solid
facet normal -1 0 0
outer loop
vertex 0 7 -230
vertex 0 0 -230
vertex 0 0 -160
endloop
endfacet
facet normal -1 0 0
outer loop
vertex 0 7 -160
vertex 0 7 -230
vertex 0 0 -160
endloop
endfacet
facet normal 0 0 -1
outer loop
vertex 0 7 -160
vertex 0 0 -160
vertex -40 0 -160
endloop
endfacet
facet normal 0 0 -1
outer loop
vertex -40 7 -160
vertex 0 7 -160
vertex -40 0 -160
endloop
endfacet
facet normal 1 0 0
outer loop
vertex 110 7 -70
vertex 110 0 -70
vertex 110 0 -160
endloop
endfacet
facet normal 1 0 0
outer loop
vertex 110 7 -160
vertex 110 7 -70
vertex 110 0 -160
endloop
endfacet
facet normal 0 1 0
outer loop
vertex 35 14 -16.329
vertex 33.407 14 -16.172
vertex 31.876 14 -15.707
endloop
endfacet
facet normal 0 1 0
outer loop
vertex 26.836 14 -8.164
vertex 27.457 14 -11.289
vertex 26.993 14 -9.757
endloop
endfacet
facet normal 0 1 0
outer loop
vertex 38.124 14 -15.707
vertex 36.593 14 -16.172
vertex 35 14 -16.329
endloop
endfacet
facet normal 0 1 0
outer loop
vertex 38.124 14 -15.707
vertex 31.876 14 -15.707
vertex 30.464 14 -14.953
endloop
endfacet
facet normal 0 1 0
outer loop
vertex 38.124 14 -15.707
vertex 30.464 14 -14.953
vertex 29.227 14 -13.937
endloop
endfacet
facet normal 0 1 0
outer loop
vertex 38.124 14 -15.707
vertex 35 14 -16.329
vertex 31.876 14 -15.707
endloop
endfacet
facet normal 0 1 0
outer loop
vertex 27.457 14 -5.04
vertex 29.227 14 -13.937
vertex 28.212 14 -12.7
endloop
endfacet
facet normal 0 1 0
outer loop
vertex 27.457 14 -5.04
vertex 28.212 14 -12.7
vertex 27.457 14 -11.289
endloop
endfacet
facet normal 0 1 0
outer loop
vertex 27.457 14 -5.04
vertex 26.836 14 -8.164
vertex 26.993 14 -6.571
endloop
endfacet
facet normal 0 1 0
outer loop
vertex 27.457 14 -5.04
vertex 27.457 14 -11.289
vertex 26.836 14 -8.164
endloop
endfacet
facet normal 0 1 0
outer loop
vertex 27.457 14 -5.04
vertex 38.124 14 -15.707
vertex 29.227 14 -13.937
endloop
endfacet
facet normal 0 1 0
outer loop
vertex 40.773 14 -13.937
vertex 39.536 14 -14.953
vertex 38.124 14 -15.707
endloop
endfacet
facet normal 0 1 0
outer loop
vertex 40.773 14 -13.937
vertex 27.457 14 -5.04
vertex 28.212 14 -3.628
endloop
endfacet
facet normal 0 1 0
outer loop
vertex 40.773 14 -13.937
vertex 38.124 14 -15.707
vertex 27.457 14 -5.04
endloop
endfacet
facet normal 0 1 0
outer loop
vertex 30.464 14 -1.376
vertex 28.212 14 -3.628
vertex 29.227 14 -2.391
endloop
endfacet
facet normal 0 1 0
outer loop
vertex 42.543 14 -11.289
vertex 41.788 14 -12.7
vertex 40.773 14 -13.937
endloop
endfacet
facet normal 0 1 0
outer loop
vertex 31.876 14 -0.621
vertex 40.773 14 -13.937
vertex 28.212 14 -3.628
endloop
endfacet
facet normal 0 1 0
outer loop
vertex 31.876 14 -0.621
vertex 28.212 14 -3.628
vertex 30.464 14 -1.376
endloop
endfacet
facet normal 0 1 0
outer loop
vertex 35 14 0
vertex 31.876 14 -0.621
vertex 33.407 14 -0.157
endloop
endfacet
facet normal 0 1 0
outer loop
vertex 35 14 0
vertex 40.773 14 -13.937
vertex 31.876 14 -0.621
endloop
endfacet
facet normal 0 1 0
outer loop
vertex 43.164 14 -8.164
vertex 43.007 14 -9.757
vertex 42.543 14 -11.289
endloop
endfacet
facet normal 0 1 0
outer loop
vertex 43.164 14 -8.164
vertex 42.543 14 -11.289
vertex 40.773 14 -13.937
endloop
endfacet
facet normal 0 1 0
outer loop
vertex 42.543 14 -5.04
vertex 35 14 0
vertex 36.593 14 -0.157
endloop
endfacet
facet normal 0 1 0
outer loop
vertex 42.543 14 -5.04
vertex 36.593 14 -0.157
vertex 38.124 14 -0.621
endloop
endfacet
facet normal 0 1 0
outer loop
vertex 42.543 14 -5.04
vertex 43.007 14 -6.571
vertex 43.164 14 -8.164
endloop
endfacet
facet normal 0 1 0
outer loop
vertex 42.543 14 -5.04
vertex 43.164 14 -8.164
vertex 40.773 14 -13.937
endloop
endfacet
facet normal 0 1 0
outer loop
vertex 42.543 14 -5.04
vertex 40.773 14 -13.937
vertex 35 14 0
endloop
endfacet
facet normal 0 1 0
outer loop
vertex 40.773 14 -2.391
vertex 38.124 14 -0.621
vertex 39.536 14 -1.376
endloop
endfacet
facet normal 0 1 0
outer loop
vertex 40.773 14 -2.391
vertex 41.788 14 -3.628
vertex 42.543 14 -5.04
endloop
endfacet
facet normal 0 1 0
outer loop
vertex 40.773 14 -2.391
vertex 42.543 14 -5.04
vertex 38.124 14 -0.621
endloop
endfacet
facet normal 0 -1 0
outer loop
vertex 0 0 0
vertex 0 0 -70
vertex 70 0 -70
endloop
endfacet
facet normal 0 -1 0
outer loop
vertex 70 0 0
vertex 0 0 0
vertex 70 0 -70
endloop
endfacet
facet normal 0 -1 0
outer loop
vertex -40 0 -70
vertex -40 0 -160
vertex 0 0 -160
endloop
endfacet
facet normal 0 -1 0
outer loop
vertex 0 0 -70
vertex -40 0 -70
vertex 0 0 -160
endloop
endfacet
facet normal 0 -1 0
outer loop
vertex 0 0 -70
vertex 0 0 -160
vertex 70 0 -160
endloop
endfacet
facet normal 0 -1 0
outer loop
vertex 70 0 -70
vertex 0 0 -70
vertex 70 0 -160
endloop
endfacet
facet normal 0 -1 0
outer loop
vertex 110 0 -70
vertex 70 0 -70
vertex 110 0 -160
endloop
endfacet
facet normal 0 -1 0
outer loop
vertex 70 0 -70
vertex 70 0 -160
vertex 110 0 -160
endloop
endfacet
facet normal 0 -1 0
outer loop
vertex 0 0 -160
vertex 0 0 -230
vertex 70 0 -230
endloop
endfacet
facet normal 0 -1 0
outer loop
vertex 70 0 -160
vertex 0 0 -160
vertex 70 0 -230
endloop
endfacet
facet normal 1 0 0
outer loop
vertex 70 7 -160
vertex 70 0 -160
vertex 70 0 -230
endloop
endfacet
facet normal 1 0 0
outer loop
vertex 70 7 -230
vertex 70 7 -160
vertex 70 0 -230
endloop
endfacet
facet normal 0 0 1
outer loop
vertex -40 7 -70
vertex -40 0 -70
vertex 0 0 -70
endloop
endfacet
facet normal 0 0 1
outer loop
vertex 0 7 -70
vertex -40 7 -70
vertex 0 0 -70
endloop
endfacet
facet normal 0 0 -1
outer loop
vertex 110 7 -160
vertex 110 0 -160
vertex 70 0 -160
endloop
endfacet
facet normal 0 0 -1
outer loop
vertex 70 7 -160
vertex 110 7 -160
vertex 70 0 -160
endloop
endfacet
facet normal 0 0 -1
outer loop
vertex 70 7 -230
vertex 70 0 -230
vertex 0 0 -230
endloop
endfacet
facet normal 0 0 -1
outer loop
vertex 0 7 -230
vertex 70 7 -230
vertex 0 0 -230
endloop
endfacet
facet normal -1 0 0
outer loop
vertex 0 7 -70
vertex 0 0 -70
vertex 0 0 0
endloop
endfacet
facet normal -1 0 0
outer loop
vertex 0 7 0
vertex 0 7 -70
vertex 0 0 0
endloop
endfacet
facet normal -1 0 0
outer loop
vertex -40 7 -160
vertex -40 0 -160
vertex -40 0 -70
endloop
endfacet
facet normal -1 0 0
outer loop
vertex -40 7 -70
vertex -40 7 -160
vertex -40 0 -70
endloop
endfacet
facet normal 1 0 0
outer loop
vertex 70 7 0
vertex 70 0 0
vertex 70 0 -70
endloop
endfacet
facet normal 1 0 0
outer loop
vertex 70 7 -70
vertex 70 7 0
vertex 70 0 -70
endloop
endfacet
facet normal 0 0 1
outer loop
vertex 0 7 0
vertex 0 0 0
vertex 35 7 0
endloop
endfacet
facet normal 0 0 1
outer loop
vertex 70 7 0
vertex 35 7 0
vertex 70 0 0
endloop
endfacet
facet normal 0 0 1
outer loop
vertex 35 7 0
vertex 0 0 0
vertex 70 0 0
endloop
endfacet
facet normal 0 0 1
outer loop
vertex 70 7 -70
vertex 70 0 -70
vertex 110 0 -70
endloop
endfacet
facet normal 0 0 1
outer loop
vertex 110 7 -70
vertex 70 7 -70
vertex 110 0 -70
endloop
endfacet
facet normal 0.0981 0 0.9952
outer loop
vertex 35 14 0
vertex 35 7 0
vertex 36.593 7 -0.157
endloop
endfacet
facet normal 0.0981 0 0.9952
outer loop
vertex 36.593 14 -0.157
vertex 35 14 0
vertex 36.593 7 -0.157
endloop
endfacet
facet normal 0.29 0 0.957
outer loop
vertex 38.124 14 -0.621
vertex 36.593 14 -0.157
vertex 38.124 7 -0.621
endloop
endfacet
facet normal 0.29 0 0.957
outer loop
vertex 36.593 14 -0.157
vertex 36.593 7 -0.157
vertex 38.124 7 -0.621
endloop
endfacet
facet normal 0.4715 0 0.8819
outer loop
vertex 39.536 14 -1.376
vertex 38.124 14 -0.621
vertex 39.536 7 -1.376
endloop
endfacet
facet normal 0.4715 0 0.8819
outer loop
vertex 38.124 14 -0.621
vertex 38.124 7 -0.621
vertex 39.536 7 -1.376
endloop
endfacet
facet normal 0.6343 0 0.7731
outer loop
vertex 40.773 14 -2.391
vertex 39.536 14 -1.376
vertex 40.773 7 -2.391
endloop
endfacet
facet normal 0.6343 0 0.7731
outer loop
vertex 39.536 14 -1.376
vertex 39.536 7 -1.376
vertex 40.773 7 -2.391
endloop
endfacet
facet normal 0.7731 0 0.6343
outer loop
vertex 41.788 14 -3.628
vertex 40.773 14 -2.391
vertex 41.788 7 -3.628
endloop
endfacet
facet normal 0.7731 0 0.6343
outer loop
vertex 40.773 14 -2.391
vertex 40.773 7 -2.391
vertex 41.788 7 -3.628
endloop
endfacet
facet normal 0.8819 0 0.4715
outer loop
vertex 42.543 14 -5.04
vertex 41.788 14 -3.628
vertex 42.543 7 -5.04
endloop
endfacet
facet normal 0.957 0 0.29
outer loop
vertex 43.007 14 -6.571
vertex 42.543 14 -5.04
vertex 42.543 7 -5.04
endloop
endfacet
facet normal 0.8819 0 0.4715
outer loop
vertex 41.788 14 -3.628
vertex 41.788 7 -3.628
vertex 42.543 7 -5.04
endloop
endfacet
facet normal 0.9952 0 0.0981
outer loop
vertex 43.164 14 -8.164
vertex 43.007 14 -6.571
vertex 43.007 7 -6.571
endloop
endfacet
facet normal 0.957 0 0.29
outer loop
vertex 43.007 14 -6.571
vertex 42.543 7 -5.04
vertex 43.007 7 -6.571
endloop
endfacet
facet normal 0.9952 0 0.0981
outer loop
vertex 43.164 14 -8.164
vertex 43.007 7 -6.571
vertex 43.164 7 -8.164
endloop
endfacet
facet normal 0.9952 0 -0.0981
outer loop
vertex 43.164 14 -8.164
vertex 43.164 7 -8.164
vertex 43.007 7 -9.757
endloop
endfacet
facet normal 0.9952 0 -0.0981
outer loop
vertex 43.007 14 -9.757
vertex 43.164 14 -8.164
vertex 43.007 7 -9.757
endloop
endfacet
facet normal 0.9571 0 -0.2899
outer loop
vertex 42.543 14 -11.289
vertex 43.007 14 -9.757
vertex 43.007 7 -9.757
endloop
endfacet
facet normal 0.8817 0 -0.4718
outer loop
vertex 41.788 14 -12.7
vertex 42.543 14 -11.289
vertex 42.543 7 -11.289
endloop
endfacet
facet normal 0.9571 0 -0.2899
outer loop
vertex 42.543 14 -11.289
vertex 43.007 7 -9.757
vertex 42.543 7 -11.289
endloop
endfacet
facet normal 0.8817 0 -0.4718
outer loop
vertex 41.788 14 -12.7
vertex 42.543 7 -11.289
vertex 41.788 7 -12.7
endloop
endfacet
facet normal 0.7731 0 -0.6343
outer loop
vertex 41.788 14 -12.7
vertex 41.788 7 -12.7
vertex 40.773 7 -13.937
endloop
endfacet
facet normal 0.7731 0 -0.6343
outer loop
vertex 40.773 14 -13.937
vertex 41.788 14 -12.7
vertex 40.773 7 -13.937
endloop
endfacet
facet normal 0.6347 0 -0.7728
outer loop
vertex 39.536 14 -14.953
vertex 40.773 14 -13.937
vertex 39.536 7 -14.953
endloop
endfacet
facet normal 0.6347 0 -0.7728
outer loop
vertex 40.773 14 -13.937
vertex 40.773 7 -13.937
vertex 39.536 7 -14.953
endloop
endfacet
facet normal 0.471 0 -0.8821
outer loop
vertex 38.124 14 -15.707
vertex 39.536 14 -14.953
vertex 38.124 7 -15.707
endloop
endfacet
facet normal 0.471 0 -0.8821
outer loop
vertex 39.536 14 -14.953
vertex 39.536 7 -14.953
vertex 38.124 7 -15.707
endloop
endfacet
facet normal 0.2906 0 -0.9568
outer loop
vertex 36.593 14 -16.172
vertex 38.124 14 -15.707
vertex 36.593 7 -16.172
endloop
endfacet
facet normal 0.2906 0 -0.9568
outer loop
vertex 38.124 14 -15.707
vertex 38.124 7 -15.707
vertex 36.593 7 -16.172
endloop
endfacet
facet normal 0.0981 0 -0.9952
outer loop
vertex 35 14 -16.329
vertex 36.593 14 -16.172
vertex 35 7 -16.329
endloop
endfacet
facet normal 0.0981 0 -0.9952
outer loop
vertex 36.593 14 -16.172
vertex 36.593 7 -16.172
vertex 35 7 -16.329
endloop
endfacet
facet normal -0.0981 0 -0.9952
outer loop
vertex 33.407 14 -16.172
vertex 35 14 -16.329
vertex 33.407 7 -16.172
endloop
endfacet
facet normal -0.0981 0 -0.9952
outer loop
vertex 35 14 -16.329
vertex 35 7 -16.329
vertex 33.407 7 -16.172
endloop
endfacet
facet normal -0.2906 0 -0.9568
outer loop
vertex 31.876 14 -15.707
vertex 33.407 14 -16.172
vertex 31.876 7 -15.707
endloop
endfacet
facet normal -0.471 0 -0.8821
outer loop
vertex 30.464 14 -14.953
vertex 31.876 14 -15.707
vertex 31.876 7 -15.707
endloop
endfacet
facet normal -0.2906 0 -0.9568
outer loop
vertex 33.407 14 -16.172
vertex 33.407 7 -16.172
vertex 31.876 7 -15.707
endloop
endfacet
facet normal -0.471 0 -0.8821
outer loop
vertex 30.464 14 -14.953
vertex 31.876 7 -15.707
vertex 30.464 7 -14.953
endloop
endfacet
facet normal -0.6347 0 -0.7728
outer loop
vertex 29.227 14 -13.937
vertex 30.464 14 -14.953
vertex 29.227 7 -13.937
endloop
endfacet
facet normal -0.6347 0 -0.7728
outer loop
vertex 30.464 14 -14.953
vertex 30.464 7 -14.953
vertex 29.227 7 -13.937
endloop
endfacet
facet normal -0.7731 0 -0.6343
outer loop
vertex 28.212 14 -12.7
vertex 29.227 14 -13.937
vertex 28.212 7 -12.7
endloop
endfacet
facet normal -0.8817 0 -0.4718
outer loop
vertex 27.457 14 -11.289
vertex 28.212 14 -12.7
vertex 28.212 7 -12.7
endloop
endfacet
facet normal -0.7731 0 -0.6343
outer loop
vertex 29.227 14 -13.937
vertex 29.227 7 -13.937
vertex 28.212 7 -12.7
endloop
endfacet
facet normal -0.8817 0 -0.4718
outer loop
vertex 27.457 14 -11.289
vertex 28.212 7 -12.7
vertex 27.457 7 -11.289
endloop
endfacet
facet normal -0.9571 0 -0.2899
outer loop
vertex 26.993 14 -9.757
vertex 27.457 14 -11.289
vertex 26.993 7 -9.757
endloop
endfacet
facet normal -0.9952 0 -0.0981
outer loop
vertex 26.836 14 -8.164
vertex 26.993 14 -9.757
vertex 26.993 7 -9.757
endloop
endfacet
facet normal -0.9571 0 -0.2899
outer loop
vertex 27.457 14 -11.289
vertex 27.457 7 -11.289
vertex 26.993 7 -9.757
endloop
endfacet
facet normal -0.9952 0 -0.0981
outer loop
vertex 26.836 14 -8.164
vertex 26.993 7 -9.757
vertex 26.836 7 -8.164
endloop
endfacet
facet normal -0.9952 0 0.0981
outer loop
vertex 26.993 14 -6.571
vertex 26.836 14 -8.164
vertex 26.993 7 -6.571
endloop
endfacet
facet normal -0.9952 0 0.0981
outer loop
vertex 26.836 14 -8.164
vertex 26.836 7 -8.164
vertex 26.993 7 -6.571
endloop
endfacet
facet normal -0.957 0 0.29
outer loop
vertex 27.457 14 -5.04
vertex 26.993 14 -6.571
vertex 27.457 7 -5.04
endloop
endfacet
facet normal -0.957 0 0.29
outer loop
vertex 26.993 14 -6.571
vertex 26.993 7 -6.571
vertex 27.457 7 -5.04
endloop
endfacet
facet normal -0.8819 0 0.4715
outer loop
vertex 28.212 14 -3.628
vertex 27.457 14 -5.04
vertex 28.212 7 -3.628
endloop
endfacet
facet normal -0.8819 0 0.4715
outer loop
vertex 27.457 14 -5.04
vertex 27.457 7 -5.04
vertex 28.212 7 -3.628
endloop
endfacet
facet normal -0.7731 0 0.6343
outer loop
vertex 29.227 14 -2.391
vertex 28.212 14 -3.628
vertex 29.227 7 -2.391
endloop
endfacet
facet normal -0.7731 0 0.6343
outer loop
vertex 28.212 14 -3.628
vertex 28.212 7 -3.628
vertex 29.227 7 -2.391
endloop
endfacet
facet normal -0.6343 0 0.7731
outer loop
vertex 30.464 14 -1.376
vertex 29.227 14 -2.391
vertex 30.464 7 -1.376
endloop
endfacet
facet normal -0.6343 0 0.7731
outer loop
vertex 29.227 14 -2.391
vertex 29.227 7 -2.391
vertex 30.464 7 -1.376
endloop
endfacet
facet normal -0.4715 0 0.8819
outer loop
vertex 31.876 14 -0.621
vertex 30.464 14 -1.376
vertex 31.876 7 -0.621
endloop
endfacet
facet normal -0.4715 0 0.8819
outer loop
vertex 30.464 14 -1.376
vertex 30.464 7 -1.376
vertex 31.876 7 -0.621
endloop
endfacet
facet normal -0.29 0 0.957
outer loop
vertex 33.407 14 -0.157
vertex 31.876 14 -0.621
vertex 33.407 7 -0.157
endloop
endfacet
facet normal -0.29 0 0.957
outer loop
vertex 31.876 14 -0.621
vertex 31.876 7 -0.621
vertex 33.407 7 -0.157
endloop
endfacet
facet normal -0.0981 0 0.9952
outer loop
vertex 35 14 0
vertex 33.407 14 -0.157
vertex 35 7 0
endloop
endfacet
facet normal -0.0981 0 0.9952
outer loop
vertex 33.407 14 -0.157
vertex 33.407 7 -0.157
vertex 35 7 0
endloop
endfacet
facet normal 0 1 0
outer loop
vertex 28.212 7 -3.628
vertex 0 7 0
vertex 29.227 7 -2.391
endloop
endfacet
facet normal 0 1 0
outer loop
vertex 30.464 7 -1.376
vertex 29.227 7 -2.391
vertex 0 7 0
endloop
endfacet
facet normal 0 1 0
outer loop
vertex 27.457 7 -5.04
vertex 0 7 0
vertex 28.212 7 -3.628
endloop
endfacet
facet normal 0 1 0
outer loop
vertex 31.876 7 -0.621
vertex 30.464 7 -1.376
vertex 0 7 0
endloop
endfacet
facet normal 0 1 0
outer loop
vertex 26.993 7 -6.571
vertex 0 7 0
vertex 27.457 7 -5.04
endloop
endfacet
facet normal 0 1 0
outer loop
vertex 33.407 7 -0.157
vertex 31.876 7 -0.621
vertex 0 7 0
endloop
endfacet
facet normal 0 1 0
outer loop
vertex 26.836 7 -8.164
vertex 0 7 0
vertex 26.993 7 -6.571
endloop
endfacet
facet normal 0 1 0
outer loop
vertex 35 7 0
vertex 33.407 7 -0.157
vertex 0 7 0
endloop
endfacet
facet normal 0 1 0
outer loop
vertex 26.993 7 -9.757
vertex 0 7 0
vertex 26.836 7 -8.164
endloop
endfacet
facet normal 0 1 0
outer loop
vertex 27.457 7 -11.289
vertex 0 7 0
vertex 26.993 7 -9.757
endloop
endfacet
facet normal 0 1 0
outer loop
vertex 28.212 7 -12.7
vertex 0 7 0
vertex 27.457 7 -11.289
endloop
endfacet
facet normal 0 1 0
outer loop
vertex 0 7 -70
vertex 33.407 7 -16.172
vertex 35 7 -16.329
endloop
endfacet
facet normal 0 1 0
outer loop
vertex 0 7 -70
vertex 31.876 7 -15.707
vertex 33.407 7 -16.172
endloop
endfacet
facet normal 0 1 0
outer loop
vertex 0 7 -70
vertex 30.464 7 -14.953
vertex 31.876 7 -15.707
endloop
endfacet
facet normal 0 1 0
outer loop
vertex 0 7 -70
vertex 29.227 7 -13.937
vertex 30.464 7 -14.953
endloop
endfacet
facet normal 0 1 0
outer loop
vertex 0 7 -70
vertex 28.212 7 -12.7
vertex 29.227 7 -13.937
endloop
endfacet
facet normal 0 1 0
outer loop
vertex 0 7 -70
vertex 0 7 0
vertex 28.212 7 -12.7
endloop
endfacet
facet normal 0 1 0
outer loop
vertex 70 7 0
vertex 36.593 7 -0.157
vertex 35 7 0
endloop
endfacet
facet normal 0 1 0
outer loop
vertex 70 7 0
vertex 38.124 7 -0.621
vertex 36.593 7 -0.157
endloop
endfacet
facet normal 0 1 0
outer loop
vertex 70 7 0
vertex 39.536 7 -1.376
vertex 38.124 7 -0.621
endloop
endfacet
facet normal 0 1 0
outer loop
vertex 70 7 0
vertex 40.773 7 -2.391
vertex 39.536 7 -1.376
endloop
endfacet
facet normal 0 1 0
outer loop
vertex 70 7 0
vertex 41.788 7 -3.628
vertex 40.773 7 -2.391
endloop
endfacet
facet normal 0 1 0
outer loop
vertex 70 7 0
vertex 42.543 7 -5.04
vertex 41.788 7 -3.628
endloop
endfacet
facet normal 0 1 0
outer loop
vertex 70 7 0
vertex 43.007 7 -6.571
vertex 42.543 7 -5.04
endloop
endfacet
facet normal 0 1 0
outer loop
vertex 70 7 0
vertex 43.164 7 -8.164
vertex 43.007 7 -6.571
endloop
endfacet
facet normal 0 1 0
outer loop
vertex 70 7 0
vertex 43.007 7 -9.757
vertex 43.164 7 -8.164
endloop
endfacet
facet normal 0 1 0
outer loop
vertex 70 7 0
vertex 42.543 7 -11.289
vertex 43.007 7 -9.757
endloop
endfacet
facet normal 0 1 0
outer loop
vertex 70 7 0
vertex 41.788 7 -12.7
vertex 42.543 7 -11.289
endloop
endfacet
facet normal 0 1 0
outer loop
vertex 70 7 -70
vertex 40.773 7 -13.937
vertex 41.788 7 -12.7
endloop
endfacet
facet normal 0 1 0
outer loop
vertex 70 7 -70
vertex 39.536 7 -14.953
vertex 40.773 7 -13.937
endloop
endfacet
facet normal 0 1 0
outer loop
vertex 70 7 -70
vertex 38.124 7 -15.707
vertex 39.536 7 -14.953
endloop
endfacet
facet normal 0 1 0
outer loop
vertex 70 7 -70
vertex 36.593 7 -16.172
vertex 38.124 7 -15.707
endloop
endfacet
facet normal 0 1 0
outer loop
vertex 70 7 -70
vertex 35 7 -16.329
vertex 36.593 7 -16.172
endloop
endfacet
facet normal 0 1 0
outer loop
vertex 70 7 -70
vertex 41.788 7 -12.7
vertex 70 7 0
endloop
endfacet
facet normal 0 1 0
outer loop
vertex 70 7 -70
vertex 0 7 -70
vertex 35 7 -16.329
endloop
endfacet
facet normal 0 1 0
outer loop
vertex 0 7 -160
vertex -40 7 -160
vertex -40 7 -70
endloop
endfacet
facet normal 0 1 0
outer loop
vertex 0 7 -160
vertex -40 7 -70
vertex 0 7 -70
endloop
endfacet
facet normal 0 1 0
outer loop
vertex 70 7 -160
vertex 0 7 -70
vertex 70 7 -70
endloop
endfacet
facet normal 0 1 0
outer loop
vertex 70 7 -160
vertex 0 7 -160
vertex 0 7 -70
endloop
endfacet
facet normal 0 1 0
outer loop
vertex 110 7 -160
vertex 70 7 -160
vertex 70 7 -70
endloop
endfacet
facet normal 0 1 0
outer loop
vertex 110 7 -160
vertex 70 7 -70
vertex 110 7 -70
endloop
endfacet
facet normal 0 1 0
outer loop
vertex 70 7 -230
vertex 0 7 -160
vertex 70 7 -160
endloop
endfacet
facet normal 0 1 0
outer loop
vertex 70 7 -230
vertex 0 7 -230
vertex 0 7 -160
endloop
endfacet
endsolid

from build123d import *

# Parameters (mm, degrees)
EXTRUDE_2_DEPTH = 7
SKETCH_4_R      = 8.164253287
EXTRUDE_3_DEPTH = 7


with BuildPart() as part:
    # 草图2 → 凸台-拉伸2 (new body)
    with BuildSketch(Plane(origin=(0, 0, 0), x_dir=(1, 0, 0), z_dir=(0, 1, 0))):
        Polygon((0, 230), (0, 160), (-40, 160), (-40, 70), (0, 70), (0, 0), (70, 0), (70, 70), (110, 70), (110, 160), (70, 160), (70, 230), align=None)
    extrude(amount=EXTRUDE_2_DEPTH)

    # 草图4 → 凸台-拉伸3 (add)
    with BuildSketch(Plane(origin=(0, 7, 0), x_dir=(1, 0, 0), z_dir=(0, 1, 0))):
        with Locations(Location((35, 8.164253287, 0), (0, 0, 270))):
            Circle(SKETCH_4_R)
    extrude(amount=EXTRUDE_3_DEPTH)


solid = part.part
